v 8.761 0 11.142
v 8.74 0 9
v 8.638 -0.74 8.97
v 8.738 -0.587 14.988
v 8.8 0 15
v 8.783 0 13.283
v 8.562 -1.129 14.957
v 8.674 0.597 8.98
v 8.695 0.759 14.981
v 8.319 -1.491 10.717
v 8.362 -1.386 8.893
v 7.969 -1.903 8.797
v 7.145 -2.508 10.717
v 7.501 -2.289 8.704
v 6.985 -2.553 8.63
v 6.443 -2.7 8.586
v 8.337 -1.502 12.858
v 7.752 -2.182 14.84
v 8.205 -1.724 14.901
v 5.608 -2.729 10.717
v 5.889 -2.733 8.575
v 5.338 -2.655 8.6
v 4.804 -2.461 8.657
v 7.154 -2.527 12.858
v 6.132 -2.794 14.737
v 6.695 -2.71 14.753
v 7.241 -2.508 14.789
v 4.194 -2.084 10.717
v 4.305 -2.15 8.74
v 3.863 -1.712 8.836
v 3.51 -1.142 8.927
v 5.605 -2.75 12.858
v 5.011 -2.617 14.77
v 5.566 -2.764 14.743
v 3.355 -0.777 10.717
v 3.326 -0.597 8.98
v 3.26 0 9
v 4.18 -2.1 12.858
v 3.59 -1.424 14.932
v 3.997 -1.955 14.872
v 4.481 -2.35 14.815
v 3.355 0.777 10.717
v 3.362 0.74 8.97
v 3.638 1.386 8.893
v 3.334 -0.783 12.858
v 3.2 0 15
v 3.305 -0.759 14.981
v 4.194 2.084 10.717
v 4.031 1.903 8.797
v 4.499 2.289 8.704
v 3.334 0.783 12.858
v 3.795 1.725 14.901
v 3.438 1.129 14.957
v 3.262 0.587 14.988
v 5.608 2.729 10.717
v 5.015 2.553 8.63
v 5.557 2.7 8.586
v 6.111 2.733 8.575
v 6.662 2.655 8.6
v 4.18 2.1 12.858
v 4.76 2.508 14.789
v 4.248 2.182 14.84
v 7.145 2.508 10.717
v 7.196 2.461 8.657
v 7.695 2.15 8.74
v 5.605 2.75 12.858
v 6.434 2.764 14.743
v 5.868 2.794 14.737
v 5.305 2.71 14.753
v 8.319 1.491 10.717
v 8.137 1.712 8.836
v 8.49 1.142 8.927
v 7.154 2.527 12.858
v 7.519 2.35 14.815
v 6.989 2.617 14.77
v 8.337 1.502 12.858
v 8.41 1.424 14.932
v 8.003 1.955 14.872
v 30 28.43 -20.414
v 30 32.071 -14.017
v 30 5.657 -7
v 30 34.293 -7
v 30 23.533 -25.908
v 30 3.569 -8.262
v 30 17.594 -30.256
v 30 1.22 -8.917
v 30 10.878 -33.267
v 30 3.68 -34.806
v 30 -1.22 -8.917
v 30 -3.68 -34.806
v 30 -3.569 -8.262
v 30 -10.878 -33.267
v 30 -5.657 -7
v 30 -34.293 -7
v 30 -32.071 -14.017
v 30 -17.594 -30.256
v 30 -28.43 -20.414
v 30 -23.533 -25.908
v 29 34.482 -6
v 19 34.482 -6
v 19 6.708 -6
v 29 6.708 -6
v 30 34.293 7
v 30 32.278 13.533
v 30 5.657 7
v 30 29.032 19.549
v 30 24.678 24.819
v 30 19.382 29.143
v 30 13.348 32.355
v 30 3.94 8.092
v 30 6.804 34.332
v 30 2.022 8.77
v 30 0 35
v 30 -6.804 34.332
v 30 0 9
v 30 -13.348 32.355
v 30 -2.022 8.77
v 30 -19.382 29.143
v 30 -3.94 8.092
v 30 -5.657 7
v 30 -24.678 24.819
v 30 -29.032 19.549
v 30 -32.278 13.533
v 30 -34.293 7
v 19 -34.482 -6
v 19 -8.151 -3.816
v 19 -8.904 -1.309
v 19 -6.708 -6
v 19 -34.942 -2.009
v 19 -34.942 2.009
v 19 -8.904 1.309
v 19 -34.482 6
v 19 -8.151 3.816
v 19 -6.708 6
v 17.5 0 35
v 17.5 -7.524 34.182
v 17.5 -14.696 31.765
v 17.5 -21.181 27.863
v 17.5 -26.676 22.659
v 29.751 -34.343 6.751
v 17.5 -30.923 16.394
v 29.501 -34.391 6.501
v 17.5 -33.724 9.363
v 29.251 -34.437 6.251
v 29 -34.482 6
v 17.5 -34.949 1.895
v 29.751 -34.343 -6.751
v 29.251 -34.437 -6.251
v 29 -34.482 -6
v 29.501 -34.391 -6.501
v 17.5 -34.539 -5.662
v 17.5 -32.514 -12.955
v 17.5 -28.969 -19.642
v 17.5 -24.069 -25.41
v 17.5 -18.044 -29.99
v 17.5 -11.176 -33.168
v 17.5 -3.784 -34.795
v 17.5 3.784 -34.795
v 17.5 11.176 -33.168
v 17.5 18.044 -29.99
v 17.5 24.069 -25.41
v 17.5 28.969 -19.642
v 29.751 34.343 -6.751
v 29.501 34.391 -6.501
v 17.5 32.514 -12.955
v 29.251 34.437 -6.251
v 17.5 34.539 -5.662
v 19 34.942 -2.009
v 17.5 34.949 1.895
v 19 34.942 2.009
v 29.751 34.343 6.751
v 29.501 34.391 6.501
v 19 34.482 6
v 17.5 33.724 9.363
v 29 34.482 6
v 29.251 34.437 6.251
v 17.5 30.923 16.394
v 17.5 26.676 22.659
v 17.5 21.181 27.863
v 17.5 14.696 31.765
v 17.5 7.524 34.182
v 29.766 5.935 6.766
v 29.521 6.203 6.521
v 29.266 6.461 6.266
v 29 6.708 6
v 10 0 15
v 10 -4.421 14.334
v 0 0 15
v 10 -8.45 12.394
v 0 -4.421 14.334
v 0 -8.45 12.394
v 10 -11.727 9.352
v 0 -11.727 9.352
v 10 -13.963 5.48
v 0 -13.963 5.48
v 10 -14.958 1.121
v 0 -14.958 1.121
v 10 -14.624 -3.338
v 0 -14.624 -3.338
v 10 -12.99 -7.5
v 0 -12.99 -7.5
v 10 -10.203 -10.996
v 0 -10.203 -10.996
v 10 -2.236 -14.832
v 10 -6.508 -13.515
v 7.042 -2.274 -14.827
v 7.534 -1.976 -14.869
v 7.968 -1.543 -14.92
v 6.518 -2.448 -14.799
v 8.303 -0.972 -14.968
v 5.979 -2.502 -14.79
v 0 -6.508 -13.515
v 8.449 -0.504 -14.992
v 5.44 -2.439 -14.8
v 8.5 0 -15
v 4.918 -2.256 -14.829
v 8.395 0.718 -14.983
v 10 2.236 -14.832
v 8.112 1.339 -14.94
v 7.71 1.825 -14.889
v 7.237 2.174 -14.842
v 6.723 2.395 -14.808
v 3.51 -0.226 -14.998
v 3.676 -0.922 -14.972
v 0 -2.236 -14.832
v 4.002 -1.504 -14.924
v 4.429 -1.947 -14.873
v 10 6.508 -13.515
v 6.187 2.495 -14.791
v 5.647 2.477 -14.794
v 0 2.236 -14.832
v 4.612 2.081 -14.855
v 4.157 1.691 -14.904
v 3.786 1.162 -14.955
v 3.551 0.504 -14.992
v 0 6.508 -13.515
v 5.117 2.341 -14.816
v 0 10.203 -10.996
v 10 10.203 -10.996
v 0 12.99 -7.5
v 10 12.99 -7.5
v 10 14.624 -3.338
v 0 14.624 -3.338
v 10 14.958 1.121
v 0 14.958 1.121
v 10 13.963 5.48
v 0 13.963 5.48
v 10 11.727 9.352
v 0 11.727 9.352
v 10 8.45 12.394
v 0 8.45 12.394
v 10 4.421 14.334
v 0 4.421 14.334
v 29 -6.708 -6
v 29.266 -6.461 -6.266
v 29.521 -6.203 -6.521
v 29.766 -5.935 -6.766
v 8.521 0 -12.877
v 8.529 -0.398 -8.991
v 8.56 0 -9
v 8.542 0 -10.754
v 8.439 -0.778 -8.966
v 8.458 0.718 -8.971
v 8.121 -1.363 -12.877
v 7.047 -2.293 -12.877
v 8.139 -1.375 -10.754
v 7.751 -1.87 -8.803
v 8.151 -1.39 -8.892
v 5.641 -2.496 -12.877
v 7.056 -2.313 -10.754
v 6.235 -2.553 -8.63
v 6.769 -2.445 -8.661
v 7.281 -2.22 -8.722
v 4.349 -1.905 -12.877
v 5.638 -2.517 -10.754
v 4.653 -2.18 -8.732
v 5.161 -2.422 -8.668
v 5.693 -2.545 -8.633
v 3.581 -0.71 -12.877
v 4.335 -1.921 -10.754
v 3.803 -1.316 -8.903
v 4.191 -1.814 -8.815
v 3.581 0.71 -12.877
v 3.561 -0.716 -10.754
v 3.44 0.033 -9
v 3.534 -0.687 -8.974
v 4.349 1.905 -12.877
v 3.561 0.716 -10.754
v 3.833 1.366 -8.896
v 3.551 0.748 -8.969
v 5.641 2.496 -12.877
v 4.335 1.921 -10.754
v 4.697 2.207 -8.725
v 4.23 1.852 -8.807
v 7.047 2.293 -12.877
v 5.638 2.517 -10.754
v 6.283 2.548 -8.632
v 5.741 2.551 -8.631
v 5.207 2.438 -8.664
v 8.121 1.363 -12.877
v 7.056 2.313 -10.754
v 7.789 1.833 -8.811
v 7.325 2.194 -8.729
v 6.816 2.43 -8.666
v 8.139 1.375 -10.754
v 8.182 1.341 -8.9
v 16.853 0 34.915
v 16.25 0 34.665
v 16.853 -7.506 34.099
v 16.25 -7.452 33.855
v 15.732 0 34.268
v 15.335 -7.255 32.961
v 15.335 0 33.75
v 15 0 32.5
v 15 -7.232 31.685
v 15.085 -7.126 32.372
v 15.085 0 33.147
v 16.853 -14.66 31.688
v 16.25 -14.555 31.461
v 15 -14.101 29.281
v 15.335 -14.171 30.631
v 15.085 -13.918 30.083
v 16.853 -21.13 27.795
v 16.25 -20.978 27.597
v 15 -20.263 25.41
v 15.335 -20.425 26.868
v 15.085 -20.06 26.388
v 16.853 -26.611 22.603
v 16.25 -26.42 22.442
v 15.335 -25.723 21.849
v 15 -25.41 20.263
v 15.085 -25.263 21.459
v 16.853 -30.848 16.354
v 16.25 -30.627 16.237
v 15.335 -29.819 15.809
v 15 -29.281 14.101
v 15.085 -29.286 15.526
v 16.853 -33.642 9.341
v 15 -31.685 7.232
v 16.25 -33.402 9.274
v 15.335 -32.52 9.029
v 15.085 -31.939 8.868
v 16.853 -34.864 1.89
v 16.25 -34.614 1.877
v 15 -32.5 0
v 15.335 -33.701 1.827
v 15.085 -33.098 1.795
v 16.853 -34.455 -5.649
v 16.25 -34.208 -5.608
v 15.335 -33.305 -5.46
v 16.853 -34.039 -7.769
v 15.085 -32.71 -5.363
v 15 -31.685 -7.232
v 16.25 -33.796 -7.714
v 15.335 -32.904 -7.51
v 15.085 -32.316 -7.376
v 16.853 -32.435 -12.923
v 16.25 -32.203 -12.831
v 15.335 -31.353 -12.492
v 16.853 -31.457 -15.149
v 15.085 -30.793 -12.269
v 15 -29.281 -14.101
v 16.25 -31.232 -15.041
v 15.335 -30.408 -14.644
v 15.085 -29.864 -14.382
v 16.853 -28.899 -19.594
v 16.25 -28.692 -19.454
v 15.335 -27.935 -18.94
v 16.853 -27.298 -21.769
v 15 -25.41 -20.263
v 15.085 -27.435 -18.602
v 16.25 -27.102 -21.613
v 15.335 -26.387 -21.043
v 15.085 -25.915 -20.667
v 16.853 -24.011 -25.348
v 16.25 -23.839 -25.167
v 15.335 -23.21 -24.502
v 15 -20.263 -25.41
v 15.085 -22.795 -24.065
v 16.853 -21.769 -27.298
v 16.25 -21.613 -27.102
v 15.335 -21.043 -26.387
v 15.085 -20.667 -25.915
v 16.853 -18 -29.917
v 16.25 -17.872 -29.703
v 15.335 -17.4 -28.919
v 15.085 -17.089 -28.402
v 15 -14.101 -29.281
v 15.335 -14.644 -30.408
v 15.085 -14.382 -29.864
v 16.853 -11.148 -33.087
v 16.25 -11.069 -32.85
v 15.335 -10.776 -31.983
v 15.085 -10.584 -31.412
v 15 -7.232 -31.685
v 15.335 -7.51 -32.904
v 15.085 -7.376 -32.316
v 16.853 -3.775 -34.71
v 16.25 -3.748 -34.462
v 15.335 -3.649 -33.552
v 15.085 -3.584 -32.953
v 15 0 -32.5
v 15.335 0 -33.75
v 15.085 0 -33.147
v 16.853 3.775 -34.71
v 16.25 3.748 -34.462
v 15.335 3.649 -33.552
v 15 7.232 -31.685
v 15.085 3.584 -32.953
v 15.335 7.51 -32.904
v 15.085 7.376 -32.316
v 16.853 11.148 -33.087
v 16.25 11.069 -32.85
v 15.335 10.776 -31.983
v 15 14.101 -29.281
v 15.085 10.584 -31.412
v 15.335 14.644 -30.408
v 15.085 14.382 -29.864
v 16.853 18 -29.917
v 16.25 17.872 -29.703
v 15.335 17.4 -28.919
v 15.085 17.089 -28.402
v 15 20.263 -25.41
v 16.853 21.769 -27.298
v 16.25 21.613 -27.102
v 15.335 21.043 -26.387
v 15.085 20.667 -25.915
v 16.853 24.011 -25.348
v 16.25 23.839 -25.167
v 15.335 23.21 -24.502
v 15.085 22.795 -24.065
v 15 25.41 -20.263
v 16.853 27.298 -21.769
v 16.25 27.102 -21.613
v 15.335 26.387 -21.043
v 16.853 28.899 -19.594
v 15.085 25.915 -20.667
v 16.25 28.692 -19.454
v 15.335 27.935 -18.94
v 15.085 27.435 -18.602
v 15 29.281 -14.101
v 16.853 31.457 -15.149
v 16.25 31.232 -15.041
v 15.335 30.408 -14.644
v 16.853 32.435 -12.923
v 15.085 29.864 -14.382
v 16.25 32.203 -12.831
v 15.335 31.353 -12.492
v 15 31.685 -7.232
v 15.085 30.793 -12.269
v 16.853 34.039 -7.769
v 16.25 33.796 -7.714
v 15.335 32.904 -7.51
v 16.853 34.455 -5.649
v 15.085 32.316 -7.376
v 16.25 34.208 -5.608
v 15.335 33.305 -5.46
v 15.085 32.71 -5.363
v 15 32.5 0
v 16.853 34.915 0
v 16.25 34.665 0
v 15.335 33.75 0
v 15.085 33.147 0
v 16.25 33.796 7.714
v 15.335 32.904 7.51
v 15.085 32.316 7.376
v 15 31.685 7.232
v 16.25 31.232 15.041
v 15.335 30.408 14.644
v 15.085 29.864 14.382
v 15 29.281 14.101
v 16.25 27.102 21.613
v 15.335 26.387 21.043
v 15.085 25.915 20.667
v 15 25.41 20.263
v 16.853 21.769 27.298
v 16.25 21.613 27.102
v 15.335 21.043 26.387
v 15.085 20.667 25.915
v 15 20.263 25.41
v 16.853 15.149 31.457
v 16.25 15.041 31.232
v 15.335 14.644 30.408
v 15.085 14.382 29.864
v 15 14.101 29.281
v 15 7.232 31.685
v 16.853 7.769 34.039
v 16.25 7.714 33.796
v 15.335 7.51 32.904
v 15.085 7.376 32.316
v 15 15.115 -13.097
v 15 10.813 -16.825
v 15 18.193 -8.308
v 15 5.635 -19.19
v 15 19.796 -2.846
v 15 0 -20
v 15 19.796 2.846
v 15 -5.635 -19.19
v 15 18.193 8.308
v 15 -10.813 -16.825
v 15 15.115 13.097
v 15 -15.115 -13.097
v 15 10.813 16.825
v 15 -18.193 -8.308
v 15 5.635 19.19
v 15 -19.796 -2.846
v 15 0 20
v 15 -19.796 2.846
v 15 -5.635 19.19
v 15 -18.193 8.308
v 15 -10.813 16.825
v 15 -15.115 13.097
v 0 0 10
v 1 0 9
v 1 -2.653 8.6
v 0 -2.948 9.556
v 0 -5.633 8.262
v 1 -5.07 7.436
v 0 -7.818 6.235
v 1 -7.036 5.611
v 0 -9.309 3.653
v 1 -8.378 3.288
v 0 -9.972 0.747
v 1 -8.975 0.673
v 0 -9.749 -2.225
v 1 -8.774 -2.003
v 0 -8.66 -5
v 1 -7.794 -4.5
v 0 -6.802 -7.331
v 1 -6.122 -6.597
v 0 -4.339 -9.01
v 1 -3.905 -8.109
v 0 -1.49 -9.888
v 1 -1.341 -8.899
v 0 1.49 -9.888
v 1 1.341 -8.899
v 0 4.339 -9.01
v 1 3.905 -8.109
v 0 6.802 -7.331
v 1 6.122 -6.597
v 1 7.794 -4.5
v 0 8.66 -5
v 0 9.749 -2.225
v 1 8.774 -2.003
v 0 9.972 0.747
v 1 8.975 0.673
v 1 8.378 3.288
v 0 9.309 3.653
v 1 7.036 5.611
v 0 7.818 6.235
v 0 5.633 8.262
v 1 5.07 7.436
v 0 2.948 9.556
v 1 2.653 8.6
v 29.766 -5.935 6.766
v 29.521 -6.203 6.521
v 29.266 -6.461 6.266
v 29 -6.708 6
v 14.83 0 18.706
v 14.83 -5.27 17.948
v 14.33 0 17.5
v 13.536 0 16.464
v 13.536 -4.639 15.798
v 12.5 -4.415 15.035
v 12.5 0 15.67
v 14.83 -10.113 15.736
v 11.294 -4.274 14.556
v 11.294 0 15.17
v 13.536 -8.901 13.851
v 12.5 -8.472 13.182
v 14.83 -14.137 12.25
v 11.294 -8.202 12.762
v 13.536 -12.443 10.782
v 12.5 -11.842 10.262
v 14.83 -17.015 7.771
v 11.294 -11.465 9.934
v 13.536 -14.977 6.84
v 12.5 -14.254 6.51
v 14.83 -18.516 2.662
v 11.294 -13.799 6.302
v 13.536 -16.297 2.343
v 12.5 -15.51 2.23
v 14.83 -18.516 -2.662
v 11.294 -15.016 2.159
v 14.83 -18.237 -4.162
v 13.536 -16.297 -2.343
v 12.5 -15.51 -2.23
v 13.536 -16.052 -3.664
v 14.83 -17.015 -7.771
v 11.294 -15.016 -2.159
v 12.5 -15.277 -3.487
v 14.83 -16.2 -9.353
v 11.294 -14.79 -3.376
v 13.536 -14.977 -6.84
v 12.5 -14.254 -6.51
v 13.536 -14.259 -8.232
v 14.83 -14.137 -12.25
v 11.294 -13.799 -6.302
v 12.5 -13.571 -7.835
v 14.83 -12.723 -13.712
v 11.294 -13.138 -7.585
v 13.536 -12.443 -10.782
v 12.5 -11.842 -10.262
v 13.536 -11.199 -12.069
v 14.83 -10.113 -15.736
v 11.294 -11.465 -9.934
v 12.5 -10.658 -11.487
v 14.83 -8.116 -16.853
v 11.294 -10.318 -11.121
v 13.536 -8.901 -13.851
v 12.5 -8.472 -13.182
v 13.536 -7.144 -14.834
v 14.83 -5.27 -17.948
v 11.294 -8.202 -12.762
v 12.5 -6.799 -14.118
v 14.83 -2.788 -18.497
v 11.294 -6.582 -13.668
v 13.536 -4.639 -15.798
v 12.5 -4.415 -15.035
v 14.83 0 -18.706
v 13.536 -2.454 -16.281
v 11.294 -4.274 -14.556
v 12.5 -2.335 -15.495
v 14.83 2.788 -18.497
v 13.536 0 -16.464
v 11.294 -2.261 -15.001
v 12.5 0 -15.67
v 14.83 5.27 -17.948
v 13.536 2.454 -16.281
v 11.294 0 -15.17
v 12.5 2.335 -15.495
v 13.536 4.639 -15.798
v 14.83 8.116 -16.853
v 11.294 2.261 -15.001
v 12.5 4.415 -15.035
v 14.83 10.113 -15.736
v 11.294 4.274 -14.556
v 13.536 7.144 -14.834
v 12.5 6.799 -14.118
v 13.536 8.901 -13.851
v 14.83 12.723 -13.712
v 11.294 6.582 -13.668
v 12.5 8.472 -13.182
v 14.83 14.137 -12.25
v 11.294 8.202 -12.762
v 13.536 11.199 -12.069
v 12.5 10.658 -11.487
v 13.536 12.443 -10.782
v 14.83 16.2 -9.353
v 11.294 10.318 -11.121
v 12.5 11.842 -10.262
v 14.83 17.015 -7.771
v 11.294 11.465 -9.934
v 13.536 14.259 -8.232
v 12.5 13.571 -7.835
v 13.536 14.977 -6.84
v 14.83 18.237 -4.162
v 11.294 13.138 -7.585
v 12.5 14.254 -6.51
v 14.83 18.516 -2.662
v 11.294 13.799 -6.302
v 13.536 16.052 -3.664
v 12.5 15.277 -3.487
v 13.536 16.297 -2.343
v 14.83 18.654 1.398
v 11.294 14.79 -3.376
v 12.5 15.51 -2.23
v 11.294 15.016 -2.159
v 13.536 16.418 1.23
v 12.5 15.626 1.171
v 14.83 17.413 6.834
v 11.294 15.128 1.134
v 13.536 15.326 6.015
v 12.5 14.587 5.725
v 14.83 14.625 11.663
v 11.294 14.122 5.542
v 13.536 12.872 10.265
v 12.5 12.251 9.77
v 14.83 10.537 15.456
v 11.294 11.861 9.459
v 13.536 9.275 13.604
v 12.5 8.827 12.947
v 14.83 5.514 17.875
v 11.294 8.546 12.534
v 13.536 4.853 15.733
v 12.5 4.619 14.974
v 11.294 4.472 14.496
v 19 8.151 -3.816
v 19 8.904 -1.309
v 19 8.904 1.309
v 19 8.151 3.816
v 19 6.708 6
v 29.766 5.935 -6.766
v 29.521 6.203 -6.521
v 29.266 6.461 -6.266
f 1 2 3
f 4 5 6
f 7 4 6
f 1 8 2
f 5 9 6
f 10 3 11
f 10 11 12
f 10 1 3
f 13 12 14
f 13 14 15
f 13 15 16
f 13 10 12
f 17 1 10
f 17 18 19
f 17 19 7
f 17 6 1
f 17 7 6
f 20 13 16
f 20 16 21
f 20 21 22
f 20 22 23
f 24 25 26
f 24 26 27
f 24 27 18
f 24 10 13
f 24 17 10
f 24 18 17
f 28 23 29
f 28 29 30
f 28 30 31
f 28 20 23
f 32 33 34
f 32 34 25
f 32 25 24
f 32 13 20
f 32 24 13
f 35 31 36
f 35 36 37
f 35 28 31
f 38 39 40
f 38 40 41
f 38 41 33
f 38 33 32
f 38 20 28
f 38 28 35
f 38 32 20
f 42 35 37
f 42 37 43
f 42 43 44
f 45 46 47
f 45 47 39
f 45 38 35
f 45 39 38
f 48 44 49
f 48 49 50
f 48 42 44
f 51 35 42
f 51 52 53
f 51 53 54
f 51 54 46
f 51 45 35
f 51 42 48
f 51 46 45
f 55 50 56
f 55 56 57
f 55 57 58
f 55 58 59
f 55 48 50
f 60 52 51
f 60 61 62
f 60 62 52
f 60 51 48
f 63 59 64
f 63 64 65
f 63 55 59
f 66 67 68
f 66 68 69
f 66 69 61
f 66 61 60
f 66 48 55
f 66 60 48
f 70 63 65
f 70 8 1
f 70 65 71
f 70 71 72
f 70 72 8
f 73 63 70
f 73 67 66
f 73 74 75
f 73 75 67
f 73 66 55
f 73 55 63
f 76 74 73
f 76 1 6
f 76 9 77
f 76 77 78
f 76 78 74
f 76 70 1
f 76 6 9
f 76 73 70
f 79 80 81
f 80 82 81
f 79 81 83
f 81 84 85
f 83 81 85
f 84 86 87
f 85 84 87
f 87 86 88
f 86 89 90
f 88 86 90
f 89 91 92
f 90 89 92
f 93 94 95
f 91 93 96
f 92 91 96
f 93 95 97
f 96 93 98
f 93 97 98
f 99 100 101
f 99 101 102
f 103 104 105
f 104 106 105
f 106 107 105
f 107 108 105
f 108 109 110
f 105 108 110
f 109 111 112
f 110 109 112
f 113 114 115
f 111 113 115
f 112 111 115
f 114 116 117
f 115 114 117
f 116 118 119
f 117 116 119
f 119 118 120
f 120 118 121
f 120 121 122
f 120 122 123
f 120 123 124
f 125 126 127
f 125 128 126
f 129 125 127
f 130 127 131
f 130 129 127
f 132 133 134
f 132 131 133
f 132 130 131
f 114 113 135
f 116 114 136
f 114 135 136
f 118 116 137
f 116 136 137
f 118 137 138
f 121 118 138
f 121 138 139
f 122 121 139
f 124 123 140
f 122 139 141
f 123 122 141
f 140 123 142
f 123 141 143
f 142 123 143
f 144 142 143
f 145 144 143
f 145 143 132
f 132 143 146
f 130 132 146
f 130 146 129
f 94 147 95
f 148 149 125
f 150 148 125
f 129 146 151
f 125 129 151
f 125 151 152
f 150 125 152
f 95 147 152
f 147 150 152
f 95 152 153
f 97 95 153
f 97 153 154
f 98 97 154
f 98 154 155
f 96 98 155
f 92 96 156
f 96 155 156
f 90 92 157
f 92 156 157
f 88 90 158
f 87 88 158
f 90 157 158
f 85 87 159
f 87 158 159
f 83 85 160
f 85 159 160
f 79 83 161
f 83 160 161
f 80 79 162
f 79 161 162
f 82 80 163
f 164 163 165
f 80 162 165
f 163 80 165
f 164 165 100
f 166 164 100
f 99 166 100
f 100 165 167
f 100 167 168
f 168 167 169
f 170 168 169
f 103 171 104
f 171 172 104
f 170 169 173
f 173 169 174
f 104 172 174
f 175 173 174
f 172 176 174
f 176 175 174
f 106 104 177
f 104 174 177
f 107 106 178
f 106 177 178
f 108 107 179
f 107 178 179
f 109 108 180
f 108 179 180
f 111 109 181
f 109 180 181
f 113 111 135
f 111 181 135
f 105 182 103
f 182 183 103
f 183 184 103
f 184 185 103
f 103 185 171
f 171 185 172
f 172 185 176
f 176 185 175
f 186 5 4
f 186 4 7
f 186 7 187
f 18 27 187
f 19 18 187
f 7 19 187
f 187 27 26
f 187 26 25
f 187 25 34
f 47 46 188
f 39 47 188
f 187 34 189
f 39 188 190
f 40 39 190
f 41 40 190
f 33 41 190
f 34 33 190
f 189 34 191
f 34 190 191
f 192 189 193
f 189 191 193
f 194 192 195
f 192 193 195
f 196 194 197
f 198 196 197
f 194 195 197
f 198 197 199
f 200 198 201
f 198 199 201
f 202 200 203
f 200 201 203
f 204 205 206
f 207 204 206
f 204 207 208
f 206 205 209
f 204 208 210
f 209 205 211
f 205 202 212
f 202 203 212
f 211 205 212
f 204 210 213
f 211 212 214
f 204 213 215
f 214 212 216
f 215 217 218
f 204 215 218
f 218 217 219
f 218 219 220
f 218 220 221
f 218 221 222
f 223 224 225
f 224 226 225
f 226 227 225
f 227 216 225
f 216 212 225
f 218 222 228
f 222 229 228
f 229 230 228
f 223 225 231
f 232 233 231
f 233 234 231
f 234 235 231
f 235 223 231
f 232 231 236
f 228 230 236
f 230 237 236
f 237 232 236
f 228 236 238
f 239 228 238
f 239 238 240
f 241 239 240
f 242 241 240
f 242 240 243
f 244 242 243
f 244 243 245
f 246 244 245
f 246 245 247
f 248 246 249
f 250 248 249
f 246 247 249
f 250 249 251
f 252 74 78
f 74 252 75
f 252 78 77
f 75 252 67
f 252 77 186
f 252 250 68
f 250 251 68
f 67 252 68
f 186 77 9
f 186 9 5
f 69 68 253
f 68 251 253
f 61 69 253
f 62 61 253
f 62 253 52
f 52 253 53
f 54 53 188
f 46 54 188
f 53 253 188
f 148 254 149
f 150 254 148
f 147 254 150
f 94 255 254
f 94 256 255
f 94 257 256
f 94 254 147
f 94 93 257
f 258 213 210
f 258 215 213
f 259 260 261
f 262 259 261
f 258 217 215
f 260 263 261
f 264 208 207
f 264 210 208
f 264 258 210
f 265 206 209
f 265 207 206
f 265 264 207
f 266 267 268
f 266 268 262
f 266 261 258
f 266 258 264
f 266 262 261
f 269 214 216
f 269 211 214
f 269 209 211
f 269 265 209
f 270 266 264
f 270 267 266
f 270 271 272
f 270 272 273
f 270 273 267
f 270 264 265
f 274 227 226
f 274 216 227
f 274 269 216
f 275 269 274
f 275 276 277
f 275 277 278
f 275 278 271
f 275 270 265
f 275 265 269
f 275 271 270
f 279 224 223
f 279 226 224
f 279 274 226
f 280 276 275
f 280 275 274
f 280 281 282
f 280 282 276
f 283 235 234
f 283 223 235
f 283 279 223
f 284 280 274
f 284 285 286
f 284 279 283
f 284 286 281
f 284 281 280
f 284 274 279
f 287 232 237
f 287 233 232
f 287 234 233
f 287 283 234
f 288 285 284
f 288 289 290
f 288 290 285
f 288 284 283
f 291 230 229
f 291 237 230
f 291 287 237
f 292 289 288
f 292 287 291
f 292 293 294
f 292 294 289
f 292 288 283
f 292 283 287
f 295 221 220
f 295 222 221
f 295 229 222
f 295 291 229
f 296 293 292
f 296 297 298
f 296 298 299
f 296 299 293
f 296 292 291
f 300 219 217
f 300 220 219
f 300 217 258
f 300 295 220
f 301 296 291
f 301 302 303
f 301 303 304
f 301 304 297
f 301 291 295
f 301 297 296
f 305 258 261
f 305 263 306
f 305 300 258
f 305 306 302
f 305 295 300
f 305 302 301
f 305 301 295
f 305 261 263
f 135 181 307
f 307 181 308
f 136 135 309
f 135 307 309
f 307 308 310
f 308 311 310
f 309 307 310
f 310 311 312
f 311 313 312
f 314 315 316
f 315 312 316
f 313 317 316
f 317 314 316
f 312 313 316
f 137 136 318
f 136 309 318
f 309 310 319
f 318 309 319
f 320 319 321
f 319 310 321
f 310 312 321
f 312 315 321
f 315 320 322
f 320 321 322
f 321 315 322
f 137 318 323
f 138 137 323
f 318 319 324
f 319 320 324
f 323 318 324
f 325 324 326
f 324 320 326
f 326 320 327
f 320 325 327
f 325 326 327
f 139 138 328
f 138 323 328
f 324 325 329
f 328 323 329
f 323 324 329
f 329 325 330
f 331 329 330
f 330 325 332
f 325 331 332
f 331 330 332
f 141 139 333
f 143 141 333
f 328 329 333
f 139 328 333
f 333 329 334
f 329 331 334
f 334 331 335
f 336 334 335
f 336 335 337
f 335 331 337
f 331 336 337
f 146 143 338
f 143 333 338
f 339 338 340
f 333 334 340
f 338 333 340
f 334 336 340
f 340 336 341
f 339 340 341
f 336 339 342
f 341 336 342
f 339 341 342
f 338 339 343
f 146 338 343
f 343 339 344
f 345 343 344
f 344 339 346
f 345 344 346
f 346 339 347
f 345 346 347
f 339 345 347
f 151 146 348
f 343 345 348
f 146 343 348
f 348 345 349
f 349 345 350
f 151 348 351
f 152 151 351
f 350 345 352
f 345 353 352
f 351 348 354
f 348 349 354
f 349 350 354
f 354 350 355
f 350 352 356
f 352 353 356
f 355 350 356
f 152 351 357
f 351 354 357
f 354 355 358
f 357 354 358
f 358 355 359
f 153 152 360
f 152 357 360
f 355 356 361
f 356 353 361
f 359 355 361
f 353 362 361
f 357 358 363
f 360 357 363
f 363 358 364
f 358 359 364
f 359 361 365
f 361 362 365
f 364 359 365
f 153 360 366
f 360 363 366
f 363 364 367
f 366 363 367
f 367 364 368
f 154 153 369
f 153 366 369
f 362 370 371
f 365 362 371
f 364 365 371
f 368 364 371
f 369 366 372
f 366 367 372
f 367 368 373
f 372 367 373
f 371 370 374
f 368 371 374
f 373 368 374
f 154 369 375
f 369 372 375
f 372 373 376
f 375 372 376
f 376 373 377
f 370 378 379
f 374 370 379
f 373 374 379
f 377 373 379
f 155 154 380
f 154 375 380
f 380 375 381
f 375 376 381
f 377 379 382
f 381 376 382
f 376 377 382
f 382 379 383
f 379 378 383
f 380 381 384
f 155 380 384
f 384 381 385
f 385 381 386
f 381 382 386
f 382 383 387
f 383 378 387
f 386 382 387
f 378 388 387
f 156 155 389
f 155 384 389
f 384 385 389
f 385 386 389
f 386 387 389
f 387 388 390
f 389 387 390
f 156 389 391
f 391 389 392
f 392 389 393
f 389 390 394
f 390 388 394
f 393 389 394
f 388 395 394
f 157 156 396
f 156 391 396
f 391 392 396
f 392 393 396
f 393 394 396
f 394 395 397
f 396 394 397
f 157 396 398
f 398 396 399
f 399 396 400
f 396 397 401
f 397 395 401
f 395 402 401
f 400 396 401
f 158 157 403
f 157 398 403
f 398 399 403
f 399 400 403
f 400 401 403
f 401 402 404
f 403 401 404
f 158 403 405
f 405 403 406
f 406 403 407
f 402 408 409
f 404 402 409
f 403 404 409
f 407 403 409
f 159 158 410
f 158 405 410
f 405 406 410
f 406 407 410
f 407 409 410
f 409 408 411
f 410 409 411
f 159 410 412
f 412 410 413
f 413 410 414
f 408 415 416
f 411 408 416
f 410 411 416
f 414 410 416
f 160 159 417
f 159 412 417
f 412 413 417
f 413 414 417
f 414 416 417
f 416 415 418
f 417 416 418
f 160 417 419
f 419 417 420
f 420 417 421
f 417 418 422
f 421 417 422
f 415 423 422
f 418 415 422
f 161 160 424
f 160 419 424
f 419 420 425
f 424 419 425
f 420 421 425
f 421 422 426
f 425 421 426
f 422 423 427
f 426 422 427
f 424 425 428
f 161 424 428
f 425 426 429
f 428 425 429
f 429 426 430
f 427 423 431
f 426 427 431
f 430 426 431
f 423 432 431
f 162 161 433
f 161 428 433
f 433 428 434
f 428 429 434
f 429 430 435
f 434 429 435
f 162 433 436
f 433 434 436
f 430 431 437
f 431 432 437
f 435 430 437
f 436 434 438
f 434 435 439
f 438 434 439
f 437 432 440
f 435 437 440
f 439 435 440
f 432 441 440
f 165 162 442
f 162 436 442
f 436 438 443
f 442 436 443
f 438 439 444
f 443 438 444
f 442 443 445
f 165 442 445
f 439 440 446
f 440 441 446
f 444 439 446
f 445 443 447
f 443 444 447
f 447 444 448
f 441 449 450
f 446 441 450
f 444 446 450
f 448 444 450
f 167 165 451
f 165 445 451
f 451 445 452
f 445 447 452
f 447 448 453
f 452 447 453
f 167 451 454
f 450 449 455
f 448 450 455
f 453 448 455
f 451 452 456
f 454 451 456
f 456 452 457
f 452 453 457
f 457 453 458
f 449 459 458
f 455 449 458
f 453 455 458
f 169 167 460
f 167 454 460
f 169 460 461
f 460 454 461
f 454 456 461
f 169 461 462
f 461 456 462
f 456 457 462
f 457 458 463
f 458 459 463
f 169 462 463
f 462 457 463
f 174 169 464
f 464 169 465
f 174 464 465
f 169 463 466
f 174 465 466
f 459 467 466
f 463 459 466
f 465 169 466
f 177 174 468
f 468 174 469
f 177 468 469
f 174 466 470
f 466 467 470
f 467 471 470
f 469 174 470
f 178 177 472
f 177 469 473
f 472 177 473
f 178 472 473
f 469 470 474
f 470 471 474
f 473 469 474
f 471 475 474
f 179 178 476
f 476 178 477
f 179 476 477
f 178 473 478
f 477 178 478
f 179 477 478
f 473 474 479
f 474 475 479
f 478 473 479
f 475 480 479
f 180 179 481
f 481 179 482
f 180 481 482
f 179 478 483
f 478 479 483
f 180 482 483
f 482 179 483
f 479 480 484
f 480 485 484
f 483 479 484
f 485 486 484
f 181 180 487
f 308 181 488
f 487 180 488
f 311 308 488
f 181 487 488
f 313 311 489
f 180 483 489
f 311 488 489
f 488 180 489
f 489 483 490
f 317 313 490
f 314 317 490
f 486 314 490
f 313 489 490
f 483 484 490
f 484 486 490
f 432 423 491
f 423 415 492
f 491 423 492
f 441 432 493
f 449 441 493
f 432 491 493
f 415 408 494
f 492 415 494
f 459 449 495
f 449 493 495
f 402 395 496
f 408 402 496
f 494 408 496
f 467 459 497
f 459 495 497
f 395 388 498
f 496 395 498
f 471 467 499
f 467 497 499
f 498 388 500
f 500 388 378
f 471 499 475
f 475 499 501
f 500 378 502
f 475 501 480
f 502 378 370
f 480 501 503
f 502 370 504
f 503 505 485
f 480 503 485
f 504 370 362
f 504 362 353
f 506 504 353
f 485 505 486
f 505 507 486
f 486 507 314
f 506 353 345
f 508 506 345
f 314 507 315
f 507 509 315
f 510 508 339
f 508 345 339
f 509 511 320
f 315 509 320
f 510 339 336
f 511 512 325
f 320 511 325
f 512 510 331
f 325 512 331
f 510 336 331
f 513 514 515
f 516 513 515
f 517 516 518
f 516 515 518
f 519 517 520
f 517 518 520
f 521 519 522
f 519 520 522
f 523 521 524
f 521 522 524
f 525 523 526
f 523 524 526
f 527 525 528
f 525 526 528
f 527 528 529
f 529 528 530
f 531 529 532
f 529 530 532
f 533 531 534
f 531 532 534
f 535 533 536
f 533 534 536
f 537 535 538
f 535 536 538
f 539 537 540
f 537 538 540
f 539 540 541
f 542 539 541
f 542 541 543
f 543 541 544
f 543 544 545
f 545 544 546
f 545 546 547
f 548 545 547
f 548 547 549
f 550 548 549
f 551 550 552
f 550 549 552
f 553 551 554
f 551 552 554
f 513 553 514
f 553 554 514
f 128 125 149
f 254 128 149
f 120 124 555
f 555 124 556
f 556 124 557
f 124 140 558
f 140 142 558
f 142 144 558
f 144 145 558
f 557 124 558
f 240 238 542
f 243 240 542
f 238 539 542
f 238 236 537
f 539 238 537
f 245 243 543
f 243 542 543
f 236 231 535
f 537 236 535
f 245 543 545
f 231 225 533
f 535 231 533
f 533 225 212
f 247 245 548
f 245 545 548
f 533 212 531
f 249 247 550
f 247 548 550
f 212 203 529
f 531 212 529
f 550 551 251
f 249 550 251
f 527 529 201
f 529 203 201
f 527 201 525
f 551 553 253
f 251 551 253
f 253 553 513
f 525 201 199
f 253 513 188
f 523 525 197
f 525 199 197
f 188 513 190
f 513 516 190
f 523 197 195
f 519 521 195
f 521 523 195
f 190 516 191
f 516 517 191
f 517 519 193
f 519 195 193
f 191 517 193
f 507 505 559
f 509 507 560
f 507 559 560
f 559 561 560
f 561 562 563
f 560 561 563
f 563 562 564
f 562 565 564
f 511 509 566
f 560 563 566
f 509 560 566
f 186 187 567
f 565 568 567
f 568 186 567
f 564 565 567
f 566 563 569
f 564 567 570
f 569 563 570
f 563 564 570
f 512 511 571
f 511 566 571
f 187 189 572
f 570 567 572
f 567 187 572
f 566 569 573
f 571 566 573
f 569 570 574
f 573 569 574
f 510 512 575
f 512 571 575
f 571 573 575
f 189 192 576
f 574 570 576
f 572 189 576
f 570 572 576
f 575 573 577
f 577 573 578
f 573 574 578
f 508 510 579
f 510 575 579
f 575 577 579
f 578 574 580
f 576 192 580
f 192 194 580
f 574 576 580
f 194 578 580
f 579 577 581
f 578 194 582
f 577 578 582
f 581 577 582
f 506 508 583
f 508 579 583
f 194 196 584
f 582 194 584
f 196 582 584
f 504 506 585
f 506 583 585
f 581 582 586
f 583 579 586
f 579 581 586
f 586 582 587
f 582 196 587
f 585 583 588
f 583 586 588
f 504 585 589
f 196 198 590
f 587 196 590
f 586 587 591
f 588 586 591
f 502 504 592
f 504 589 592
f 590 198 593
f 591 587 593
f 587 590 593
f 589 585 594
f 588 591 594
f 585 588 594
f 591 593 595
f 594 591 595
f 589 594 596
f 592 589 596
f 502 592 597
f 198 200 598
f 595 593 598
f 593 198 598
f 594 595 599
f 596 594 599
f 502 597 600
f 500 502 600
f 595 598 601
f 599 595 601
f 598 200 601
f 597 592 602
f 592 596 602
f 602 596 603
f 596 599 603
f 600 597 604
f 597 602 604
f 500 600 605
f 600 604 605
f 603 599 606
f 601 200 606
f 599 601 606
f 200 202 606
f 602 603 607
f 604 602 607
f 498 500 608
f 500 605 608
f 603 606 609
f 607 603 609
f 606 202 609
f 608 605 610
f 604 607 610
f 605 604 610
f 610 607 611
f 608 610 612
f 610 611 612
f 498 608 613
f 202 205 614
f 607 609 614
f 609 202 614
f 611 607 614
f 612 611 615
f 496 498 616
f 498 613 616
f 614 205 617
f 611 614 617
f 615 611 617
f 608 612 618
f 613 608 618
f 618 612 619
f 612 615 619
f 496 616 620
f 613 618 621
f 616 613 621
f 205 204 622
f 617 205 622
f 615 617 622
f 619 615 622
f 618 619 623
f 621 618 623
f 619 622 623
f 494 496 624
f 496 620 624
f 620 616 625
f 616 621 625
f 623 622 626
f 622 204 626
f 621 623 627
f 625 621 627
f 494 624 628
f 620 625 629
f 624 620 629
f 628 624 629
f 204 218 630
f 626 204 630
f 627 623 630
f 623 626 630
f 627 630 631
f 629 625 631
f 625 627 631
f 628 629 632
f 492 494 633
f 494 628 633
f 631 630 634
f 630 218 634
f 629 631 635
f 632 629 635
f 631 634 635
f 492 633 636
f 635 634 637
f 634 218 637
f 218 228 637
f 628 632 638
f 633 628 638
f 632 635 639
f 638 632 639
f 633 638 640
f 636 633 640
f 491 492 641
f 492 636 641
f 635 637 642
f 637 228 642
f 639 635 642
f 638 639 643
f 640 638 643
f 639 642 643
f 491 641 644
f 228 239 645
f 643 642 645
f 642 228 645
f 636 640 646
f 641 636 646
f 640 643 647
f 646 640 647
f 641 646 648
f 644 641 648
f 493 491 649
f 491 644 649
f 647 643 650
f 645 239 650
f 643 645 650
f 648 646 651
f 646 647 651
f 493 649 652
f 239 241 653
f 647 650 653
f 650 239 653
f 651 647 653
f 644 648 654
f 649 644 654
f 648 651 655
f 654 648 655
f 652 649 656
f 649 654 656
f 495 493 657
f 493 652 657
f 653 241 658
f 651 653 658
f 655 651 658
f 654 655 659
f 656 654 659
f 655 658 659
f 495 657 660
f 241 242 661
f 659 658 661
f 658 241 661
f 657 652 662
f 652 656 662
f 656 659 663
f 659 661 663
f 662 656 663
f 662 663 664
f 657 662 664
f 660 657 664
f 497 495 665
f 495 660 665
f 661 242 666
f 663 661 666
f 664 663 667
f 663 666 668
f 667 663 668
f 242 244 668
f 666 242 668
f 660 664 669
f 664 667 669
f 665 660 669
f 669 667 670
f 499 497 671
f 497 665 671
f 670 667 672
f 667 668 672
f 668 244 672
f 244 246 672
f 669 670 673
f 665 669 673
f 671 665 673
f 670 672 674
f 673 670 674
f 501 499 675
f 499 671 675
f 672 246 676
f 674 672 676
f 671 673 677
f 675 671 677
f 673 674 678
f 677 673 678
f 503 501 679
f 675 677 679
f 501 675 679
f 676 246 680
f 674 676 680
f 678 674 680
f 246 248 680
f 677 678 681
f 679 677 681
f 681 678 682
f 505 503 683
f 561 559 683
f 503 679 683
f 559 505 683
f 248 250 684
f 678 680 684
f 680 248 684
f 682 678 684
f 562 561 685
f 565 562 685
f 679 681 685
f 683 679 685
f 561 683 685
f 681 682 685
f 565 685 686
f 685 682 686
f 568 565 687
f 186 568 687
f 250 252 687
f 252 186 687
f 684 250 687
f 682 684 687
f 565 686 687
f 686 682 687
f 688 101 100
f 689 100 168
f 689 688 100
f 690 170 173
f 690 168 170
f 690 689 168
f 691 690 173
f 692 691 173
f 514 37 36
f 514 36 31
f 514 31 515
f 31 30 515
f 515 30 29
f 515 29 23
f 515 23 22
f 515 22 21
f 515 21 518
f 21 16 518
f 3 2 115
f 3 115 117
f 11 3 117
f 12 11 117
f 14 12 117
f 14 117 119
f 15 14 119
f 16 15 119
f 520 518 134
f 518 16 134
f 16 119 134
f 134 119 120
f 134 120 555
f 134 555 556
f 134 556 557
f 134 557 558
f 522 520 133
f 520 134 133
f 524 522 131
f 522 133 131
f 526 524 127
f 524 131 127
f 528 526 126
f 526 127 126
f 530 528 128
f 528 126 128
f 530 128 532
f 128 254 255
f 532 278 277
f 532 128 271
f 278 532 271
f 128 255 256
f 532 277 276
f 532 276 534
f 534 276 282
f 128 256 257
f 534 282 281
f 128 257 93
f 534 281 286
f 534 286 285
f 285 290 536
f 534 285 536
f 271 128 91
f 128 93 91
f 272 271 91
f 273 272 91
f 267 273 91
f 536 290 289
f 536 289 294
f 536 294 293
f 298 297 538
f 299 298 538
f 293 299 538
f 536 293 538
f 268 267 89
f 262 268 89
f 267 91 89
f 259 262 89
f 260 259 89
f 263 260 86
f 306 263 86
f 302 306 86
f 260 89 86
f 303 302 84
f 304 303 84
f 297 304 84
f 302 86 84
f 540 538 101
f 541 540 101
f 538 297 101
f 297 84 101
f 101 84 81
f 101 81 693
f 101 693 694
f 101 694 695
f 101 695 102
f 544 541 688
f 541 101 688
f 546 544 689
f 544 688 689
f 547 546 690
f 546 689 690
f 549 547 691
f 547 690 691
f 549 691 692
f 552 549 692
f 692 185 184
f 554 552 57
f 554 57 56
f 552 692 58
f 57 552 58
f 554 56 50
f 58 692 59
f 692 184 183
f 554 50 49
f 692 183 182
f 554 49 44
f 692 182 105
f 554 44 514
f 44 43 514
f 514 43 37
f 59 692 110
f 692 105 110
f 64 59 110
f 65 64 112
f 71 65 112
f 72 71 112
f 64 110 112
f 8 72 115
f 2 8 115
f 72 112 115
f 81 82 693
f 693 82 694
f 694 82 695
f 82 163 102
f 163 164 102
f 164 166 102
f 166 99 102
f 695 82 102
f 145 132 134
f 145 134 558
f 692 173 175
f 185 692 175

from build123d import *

# Parameters (mm, degrees)
F2_W     = 11
F2_H     = 12
F3_DEPTH = 40
F4_SIZE  = 1
F5_W     = 2.5
F5_H     = 0.6369768083
F5_W_2   = 2.8
F5_H_2   = 0.9896519035


with BuildPart() as f1:
    # F0 (on Front) → F1 (revolve)
    with BuildSketch(Plane.XZ):
        with BuildLine():
            Line((0, 15), (0, 9))
            Line((0, 9), (30, 9))
            Line((30, 9), (30, 35))
            Line((30, 35), (17.5, 35))
            ThreePointArc((17.5, 35), (15.732233047, 34.267766953), (15, 32.5))
            Line((15, 32.5), (15, 20))
            ThreePointArc((15, 20), (13.5355339059, 16.4644660941), (10, 15))
            Line((10, 15), (0, 15))
        make_face()
    revolve(axis=Axis((13.2997054259, 0, 0), (1, 0, 0)))

    # F2 (on Front) → F3 (cut, symmetric)
    with BuildSketch(Plane.XZ):
        with Locations((24.5, 0)):
            Rectangle(F2_W, F2_H)
    extrude(amount=F3_DEPTH, both=True, mode=Mode.SUBTRACT)

    # F4
    f4_edges = [f1.edges().sort_by_distance(p)[0] for p in [
        (0, 0, -9),
        (30, 20.595042, 6),
        (30, -20.595042, 6),
        (30, -20.595042, -6),
        (30, 20.595042, -6),
    ]]
    chamfer(f4_edges, length=F4_SIZE)

    # F5 (on Front) → F6 (revolve, cut)
    with BuildSketch(Plane.XZ):
        with Locations((7.25, -15.3184884042)):
            Rectangle(F5_W, F5_H)
        Polygon((6, -15), (8.5, -15), (8.8, 15), (6, 15), align=None)
        with Locations((7.4, 15.4948259518)):
            Rectangle(F5_W_2, F5_H_2)
    revolve(axis=Axis((6, 0, -0.3860071301), (0, 0, -1)), mode=Mode.SUBTRACT)


solid = f1.part
